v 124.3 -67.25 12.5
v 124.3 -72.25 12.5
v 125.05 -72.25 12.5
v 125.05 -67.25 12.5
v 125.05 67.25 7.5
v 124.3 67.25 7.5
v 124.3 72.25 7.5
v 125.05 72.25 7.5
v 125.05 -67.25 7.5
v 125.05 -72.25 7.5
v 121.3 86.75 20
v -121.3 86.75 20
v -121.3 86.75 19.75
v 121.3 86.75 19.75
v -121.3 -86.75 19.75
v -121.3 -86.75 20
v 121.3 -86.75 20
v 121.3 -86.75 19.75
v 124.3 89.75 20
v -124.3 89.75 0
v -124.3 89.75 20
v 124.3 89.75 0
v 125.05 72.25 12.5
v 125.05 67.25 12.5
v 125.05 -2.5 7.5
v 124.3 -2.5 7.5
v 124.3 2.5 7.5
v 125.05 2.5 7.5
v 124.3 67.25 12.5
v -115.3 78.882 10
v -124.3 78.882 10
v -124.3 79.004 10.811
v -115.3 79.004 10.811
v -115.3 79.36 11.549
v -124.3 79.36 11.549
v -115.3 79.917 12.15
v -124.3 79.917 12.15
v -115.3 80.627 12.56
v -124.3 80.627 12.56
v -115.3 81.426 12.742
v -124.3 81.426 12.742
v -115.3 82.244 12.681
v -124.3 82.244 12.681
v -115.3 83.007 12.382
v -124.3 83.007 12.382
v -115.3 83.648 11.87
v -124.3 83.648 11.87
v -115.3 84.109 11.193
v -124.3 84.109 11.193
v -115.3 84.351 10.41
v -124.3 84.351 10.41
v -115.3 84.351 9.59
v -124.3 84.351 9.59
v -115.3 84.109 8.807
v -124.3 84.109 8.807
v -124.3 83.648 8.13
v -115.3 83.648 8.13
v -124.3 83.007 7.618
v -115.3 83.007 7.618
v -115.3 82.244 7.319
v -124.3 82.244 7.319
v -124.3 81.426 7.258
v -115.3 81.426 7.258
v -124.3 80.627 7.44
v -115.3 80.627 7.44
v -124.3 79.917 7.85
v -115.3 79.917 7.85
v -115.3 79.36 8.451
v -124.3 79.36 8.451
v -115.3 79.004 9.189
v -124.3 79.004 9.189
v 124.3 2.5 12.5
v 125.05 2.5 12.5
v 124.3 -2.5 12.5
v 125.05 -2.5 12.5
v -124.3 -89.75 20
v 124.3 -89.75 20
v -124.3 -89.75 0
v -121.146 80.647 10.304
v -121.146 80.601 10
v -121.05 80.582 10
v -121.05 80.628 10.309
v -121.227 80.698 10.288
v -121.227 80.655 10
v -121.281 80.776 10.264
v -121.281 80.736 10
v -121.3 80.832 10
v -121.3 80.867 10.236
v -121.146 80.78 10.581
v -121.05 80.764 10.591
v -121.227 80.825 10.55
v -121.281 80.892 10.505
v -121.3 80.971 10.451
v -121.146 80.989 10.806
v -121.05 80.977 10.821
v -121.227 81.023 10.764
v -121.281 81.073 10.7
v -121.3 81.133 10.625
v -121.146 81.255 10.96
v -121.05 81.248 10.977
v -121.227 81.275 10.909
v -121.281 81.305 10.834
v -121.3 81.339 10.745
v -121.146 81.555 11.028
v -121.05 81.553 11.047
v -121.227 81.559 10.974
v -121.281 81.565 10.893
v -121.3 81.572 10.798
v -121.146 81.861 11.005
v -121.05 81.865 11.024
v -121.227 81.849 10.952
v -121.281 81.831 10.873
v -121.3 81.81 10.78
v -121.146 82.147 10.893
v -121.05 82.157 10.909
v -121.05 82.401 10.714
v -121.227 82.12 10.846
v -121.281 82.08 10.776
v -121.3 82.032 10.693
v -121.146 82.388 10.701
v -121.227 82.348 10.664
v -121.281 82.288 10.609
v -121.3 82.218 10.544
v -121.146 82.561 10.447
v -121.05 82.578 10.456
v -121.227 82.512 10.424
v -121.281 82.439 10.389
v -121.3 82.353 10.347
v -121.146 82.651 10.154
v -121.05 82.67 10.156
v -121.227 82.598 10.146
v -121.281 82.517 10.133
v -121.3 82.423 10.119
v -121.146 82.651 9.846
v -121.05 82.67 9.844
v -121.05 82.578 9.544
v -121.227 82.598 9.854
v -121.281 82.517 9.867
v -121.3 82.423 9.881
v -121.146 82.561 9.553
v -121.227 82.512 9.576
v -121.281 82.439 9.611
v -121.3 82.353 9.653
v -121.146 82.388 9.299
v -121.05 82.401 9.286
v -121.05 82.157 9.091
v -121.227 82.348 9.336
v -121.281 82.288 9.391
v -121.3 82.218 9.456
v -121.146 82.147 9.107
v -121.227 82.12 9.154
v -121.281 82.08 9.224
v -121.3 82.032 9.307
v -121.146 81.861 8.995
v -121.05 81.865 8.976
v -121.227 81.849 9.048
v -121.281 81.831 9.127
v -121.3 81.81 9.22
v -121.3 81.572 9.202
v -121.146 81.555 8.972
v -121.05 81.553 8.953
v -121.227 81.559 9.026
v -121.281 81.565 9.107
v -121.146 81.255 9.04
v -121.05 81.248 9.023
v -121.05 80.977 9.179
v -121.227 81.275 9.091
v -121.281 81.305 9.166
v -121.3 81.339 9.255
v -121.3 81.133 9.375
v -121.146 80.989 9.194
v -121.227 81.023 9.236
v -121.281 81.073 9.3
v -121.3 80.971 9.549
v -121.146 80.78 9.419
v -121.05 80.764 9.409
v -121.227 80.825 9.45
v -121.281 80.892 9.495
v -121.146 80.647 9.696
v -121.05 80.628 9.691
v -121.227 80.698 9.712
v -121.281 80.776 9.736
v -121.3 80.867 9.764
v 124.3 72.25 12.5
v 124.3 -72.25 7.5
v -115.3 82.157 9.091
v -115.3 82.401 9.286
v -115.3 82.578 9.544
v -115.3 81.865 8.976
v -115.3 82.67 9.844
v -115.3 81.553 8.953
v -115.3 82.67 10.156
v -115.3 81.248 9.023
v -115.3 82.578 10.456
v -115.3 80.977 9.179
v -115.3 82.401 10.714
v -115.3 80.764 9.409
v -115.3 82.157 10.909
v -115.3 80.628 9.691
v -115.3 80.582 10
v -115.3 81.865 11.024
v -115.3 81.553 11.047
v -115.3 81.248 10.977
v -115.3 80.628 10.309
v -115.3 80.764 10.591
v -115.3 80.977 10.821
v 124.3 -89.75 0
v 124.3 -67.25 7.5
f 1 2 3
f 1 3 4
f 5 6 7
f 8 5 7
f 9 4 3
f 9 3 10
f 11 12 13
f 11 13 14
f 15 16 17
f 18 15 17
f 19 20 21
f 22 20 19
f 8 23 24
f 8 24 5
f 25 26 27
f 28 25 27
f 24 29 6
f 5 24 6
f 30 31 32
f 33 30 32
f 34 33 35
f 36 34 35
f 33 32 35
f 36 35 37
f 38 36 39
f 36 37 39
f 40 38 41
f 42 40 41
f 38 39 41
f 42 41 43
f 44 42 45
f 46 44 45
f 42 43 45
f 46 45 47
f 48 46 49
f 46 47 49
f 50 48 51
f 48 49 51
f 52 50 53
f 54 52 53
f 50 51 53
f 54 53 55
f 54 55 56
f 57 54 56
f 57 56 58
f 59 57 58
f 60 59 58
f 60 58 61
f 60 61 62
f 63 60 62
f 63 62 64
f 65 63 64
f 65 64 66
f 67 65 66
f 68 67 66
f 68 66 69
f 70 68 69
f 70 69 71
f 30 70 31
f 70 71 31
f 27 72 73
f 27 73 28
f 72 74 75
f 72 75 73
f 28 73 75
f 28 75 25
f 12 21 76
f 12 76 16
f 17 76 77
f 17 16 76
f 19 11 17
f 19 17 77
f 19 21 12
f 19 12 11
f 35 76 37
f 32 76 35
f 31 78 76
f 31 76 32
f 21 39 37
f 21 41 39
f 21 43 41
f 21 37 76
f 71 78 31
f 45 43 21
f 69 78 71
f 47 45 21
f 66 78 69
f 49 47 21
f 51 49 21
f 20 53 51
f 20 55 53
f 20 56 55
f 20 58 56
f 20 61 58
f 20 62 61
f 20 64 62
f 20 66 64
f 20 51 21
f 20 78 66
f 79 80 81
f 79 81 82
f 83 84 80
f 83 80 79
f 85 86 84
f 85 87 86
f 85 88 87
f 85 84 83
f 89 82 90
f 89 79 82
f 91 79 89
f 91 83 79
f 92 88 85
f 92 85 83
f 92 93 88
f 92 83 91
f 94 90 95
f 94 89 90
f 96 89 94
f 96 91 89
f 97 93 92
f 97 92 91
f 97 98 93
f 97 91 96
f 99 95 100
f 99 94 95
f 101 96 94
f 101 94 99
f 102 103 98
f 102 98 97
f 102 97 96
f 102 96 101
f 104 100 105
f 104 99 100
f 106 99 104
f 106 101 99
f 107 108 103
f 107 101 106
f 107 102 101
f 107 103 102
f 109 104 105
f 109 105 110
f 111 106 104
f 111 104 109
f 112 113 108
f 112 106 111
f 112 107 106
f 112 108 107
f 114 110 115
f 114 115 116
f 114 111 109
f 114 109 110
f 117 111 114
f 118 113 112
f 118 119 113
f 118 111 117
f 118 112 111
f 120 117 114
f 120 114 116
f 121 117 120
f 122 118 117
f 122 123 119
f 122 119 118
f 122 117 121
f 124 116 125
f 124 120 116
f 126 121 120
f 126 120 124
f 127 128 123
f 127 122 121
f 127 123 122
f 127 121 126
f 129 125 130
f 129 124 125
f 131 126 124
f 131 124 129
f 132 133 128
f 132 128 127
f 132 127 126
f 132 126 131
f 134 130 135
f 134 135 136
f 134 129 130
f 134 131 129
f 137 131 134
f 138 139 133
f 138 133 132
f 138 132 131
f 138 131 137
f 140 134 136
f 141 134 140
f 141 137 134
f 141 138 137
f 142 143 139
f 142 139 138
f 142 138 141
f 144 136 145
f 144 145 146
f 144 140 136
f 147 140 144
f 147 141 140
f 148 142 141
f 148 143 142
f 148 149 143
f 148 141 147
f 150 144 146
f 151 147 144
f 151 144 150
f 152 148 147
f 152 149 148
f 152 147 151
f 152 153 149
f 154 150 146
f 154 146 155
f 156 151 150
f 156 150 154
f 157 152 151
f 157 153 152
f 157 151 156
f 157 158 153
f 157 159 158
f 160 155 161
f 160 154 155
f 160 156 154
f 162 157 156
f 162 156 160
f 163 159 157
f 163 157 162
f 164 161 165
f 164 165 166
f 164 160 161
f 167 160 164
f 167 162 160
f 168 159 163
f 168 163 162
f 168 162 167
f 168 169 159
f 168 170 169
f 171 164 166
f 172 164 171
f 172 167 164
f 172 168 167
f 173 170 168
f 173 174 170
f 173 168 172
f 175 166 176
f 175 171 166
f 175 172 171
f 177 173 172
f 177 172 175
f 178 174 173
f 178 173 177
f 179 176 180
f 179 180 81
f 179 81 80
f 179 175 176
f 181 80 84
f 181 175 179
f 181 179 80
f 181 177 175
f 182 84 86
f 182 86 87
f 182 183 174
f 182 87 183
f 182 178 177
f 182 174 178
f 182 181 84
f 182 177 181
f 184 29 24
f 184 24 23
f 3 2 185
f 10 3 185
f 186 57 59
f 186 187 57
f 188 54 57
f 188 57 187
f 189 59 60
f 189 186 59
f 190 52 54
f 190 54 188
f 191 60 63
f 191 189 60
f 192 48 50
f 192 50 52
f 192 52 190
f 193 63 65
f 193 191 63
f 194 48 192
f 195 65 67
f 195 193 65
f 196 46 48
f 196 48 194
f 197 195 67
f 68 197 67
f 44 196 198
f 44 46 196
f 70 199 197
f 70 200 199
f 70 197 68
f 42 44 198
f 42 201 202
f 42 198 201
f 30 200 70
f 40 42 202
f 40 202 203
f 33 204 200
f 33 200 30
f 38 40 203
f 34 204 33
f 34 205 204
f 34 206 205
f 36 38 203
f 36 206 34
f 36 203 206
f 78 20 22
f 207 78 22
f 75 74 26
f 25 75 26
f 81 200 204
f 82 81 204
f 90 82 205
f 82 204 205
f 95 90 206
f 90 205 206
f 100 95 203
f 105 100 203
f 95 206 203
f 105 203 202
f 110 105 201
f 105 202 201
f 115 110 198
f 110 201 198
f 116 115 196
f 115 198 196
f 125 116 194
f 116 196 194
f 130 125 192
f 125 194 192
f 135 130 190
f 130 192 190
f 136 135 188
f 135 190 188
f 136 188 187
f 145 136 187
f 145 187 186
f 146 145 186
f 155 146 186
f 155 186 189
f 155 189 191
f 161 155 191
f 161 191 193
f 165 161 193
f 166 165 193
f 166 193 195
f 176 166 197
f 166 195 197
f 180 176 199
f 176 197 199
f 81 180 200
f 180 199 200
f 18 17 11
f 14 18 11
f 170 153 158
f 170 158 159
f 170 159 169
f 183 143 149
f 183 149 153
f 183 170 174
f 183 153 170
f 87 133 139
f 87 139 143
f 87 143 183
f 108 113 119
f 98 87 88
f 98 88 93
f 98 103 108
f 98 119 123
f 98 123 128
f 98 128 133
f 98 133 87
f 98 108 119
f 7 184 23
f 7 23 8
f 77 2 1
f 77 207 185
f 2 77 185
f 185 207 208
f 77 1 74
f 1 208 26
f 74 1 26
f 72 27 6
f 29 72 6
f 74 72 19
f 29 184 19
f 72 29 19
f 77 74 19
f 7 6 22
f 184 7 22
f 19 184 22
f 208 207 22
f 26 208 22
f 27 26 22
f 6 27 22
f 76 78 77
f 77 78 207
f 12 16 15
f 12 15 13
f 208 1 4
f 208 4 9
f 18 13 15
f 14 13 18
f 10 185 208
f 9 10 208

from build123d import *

# Parameters (mm, degrees)
SKETCH1_W           = 248.6
SKETCH1_H           = 179.5
BOSS_EXTRUDE1_DEPTH = 20
SKETCH2_W           = 242.6
SKETCH2_H           = 173.5
CUT_EXTRUDE1_DEPTH  = 0.25
SKETCH3_W           = 5
SKETCH3_H           = 5
BOSS_EXTRUDE2_DEPTH = 0.75
SKETCH4_R           = 2.75
CUT_EXTRUDE2_DEPTH  = 9
SKETCH6_R           = 1.05
BOSS_EXTRUDE3_DEPTH = 6
FILLET1_R           = 0.25


with BuildPart() as part:
    # Sketch1 → Boss-Extrude1 (new body)
    with BuildSketch(Plane.XY):
        Rectangle(SKETCH1_W, SKETCH1_H)
    extrude(amount=BOSS_EXTRUDE1_DEPTH)

    # Sketch2 → Cut-Extrude1 (cut)
    with BuildSketch(Plane.XY.offset(20)):
        Rectangle(SKETCH2_W, SKETCH2_H)
    extrude(amount=-CUT_EXTRUDE1_DEPTH, mode=Mode.SUBTRACT)

    # Sketch3 → Boss-Extrude2 (add)
    with BuildSketch(Plane(origin=(124.3, 0, 0), x_dir=(0, 0, -1), z_dir=(1, 0, 0))):
        with Locations((-10, 69.75)):
            Rectangle(SKETCH3_W, SKETCH3_H)
        with Locations((-10, 0)):
            Rectangle(SKETCH3_W, SKETCH3_H)
        with Locations((-10, -69.75)):
            Rectangle(SKETCH3_W, SKETCH3_H)
    extrude(amount=BOSS_EXTRUDE2_DEPTH)

    # Sketch4 → Cut-Extrude2 (cut)
    with BuildSketch(Plane.ZY.offset(124.3)):
        with Locations(Location((10, 81.631746132, 0), (0, 0, 270))):
            Circle(SKETCH4_R)
    extrude(amount=-CUT_EXTRUDE2_DEPTH, mode=Mode.SUBTRACT)

    # Sketch6 → Boss-Extrude3 (add)
    with BuildSketch(Plane.ZY.offset(115.3)):
        with Locations(Location((10, 81.631746132, 0), (0, 0, 270))):
            Circle(SKETCH6_R)
    extrude(amount=BOSS_EXTRUDE3_DEPTH)

    # Fillet1
    fillet1_edges = [part.edges().sort_by_distance(p)[0] for p in [
        (-121.3, 82.681746132, 10),
    ]]
    fillet(fillet1_edges, radius=FILLET1_R)


solid = part.part
